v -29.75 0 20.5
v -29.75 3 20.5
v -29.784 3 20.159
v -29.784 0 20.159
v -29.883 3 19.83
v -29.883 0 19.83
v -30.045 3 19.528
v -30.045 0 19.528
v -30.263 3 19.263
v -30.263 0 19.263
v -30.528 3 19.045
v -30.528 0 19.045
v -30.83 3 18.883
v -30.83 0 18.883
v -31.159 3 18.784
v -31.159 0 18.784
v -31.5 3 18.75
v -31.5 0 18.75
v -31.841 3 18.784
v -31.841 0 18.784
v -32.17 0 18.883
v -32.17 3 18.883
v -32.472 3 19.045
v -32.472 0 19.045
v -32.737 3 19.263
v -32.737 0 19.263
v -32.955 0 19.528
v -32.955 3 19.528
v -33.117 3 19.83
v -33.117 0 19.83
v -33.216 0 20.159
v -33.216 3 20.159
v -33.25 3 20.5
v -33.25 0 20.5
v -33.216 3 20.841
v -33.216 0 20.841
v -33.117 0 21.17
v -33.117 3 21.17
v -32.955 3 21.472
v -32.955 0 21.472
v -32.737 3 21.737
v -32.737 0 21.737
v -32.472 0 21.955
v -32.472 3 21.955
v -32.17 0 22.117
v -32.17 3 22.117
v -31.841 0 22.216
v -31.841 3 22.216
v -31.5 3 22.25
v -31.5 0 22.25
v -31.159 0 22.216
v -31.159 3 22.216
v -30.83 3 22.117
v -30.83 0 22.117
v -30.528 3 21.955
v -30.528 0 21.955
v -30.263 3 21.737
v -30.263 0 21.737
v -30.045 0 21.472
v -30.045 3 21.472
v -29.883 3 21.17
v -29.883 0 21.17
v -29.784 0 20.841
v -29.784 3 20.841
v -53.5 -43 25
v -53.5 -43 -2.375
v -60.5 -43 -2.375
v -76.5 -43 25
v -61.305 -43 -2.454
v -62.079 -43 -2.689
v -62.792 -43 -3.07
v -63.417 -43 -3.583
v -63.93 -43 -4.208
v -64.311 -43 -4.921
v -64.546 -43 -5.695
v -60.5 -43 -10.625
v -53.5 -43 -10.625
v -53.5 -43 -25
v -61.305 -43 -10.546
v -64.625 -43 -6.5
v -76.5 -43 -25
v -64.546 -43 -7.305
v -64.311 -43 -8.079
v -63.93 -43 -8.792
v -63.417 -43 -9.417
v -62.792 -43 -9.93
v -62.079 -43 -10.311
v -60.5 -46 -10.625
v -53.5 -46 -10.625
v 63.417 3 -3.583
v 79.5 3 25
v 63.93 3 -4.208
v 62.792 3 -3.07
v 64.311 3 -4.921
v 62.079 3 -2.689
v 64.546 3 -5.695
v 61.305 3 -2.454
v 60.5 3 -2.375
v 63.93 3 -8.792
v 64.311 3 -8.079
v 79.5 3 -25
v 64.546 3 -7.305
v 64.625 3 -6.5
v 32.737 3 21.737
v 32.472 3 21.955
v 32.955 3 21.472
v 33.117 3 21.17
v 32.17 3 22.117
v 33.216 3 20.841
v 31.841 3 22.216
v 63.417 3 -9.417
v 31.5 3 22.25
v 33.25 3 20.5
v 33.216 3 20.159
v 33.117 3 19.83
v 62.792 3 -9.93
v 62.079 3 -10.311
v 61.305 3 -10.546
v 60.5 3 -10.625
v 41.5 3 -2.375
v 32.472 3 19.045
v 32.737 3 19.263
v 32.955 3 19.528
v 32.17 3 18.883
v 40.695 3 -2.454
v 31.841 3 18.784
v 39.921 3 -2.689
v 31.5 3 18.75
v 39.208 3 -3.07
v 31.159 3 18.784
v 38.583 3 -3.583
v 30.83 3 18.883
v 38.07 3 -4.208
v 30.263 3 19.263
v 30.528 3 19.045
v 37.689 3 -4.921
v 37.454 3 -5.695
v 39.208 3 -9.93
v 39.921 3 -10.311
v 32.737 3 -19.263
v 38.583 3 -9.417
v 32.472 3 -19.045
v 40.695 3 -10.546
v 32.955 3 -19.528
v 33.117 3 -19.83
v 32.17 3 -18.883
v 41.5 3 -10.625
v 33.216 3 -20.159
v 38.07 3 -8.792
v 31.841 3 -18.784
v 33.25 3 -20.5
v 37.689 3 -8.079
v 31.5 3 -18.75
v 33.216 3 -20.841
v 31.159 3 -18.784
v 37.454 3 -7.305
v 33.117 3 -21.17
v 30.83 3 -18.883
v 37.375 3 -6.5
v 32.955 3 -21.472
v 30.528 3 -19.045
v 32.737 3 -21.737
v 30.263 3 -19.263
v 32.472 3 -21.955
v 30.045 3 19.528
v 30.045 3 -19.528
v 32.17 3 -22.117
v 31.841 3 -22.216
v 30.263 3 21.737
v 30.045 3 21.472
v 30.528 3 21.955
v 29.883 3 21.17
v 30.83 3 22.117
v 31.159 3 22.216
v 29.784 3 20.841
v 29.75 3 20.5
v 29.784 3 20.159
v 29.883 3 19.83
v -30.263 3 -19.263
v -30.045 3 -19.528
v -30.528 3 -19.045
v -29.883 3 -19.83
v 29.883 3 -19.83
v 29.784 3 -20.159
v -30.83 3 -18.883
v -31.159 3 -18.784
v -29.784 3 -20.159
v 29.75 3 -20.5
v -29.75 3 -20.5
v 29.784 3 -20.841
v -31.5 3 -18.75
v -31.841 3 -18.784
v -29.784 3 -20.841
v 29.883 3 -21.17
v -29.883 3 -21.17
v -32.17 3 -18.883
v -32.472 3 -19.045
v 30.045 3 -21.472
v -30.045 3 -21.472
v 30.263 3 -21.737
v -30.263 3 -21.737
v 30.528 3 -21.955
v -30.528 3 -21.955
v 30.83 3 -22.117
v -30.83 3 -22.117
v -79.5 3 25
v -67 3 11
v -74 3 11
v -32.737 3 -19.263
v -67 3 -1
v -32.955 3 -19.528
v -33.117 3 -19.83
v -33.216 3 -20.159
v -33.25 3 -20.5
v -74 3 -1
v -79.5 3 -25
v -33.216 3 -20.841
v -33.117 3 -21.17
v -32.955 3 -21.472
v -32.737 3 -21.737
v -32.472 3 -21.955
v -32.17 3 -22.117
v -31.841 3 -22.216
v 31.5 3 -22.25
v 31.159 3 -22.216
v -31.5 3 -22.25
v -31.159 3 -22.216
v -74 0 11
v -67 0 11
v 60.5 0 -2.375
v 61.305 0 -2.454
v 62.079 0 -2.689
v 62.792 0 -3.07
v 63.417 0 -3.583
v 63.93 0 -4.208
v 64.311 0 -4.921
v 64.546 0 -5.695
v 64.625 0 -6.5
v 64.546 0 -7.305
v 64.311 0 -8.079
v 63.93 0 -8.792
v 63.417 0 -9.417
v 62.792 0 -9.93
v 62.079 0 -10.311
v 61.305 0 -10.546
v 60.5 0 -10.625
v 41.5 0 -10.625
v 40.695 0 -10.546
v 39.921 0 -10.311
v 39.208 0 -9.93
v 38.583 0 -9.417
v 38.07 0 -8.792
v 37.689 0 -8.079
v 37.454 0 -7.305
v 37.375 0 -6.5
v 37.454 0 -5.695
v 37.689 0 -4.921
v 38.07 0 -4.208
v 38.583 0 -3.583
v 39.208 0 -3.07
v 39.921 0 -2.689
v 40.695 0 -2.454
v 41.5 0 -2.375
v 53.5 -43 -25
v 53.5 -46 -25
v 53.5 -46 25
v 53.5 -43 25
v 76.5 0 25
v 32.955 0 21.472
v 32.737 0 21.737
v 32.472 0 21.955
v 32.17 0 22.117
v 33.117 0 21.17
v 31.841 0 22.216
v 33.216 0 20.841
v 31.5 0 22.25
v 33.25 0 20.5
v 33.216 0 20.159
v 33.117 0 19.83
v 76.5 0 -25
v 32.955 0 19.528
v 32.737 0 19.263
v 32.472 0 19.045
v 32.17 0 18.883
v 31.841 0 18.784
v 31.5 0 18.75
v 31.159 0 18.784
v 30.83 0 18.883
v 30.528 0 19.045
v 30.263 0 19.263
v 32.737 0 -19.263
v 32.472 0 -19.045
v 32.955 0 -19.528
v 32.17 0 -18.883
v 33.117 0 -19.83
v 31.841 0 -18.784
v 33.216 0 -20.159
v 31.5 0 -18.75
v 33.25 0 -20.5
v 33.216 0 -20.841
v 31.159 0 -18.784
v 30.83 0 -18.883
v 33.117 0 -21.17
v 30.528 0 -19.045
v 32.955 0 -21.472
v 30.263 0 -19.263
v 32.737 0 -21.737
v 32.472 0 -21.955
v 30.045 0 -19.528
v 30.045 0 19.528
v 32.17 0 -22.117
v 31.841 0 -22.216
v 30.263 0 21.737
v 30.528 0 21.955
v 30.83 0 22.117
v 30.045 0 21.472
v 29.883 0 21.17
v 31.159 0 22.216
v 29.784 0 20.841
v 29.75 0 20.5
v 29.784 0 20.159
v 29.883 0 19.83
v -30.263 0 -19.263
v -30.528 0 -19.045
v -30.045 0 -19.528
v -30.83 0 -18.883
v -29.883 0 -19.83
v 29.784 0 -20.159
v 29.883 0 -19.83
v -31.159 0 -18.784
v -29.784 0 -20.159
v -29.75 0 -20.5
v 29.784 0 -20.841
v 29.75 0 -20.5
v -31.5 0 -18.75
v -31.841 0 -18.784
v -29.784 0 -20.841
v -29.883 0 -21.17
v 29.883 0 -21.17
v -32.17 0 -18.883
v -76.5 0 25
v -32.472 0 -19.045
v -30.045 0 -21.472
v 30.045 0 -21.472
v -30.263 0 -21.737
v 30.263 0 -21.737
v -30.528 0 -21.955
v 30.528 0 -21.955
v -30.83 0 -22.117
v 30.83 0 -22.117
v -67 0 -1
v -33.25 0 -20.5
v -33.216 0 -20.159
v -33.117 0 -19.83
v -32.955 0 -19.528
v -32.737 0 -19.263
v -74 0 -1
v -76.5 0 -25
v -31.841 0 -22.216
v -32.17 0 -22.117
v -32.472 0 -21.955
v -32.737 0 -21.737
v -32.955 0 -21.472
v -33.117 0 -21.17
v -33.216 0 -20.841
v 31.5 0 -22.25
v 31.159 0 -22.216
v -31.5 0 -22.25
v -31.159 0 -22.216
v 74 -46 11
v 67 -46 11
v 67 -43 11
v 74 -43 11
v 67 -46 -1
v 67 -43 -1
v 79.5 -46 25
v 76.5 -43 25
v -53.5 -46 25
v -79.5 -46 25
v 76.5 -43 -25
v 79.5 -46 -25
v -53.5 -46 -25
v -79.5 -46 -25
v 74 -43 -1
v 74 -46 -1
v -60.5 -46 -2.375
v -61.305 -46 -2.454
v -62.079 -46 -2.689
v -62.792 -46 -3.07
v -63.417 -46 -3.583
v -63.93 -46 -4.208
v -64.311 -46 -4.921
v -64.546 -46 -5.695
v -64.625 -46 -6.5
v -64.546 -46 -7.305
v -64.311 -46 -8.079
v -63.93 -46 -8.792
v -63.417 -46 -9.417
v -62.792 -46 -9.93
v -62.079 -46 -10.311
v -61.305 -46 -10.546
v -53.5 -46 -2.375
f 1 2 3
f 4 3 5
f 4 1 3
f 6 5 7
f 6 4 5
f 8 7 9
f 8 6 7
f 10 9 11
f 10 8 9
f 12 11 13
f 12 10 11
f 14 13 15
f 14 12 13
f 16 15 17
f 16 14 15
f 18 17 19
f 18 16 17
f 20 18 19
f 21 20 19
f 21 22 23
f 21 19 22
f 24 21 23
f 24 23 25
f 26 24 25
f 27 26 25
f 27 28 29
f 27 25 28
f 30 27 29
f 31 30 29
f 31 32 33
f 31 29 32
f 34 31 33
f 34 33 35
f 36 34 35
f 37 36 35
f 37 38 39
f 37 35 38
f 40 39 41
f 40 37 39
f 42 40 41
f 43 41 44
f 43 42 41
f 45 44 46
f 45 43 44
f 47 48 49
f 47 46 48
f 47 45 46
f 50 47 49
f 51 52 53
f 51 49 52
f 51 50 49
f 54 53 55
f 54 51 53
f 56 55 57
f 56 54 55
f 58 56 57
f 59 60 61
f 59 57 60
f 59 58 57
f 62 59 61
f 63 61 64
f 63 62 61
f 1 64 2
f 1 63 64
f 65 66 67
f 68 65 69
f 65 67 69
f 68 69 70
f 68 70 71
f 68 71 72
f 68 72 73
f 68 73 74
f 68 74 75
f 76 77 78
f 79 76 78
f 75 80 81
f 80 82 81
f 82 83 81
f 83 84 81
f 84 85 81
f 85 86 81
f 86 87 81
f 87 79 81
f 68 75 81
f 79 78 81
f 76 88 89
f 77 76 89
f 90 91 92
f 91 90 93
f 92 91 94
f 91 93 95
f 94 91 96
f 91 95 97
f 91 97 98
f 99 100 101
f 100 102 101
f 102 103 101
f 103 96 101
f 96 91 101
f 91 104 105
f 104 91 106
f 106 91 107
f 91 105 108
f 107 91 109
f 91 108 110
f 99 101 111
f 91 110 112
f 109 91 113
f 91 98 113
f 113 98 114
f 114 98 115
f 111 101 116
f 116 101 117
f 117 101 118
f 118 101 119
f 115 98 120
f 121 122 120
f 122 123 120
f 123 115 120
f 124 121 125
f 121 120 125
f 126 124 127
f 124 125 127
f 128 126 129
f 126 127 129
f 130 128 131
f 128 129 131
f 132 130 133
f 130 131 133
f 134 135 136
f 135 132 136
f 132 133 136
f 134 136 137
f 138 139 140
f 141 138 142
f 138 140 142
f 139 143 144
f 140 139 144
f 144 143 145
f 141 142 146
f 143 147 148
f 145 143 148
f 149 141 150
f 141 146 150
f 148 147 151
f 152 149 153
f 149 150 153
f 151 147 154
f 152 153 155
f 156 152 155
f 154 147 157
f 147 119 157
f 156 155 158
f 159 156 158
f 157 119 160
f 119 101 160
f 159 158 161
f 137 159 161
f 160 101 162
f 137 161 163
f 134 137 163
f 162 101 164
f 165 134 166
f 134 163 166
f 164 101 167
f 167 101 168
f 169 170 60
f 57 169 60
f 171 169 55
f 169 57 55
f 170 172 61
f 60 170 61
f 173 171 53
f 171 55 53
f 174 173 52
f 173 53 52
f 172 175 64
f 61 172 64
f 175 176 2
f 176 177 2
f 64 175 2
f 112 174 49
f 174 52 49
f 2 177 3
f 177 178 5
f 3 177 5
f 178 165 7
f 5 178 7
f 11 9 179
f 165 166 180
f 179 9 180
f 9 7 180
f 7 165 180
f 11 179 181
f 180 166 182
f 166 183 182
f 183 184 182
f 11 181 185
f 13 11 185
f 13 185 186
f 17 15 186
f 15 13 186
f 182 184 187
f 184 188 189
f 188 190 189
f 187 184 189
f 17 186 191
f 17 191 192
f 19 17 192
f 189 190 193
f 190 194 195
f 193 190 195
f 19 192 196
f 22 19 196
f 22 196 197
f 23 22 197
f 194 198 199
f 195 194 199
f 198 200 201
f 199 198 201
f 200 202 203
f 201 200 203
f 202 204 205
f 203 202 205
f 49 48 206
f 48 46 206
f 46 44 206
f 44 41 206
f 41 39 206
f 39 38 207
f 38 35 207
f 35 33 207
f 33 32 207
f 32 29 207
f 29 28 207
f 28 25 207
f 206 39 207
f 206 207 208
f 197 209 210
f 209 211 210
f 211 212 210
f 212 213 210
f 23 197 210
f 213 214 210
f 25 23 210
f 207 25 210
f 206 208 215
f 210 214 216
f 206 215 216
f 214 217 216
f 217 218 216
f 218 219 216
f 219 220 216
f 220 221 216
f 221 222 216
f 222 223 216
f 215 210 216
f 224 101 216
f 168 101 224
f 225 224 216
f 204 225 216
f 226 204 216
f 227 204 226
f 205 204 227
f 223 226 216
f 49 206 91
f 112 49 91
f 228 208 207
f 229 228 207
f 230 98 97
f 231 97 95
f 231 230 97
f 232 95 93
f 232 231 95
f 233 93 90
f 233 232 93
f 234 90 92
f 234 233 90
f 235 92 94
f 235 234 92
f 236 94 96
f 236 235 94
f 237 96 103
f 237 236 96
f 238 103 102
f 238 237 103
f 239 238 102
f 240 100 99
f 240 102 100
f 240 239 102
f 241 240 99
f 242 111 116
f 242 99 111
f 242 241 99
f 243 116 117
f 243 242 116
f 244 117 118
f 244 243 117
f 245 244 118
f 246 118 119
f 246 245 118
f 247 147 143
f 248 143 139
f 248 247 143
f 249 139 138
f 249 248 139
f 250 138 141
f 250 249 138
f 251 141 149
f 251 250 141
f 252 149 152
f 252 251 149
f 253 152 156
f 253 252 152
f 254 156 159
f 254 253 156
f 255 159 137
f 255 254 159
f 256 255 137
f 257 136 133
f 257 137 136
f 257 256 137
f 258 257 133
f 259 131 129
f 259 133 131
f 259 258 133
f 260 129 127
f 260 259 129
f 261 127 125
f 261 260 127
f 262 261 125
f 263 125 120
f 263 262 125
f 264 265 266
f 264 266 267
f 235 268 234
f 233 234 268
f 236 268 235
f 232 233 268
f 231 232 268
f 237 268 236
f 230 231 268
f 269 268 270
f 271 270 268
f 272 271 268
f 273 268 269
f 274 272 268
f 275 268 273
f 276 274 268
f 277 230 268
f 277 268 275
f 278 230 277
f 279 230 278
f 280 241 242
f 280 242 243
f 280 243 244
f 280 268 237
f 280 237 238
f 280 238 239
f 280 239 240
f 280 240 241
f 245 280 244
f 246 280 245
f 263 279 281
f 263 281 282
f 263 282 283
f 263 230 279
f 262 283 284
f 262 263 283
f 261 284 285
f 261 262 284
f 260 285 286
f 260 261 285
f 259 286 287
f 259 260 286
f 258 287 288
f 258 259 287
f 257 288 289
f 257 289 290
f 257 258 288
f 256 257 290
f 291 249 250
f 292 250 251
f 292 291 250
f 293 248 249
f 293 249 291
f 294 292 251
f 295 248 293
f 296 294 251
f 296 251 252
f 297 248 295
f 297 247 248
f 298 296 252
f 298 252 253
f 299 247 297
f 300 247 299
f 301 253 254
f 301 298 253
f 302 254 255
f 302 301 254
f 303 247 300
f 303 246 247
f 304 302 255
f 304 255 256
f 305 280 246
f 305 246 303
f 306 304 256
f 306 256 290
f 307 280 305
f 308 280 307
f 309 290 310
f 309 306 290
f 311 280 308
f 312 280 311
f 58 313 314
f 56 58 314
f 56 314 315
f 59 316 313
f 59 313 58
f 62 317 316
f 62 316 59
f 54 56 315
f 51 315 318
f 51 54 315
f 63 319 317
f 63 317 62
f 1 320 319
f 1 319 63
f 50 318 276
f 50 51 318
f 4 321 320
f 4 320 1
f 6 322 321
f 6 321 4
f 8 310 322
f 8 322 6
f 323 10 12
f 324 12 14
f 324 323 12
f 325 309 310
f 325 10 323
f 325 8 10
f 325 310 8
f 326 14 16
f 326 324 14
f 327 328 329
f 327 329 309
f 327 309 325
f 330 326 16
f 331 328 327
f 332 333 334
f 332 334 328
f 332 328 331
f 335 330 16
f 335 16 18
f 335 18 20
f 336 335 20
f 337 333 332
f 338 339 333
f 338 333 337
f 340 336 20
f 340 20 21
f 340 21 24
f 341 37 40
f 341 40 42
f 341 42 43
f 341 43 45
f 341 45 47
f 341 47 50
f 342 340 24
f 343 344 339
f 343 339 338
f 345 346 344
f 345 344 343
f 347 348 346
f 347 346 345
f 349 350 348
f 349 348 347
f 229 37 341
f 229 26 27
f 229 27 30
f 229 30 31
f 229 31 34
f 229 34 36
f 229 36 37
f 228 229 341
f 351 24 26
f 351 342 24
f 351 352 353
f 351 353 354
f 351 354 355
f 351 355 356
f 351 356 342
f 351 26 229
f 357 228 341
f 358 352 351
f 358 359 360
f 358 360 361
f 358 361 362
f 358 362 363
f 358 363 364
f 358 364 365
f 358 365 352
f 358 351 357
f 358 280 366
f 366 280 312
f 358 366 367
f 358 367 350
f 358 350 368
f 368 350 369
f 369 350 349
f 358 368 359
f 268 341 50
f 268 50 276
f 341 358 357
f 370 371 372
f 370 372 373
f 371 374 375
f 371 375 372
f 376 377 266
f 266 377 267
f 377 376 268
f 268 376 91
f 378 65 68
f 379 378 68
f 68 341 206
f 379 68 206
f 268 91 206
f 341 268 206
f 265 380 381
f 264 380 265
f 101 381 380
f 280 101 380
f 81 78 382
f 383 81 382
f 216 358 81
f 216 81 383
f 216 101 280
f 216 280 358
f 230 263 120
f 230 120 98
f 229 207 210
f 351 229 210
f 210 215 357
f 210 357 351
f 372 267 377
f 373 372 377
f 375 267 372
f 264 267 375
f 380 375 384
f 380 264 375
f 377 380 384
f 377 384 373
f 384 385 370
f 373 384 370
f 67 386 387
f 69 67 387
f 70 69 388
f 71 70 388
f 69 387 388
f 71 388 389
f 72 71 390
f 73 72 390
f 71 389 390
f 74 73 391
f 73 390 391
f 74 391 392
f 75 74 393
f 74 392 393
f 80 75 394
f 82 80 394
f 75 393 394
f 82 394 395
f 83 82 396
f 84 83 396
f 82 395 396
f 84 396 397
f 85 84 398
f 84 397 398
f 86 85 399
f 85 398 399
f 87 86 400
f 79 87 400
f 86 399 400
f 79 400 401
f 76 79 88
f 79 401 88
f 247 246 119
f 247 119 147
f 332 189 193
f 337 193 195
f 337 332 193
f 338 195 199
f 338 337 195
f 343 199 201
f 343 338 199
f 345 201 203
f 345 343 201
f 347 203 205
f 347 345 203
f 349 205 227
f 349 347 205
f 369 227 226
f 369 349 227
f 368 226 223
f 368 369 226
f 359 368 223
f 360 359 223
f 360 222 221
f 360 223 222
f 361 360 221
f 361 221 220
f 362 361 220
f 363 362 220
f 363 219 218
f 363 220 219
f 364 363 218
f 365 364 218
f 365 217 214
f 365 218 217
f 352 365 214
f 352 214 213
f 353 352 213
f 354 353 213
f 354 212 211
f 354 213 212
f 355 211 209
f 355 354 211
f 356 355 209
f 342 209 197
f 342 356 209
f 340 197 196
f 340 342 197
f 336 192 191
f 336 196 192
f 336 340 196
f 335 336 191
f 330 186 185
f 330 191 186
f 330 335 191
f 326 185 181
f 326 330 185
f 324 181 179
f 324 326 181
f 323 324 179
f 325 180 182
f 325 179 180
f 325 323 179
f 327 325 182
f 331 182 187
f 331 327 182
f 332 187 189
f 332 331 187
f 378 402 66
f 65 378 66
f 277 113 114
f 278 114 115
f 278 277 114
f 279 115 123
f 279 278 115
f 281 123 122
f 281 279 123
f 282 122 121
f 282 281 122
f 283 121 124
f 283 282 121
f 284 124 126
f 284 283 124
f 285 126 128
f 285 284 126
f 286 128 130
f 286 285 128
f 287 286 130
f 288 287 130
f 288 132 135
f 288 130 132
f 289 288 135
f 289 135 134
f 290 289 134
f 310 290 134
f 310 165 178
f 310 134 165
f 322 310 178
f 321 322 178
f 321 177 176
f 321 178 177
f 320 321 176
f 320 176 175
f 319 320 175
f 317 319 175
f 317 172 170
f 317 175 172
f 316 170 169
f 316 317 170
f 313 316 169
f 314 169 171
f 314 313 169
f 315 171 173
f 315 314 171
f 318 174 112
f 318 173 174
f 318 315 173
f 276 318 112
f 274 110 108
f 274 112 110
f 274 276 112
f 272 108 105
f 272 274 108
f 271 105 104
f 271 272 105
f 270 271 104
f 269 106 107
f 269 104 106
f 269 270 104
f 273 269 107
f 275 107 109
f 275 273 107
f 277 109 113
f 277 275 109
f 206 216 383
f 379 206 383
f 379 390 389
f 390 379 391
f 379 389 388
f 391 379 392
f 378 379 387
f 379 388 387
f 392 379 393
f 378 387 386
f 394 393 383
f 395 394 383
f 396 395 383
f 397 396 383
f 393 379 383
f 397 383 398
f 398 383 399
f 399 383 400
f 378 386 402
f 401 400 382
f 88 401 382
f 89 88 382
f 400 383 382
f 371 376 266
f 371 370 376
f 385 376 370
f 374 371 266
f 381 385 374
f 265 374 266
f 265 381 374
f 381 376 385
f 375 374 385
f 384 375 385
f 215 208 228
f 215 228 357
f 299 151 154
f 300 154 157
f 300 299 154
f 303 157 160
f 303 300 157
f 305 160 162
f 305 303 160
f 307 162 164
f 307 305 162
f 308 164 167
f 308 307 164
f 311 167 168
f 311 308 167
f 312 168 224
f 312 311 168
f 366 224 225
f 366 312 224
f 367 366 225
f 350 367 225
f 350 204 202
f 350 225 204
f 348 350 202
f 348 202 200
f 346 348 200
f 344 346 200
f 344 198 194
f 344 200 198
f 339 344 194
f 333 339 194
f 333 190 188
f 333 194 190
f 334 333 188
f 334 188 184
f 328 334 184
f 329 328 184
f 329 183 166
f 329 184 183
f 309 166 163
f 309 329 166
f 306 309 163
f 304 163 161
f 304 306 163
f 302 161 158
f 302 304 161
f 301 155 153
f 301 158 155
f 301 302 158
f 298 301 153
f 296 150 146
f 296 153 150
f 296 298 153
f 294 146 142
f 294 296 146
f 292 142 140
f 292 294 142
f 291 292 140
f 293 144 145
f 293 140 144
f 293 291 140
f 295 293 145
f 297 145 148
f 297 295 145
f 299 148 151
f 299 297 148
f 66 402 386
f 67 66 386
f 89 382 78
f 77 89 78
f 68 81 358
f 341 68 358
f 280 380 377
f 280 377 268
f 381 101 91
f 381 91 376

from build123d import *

# Parameters (mm, degrees)
BOSS_EXTRUDE1_DEPTH = 3
BOSS_EXTRUDE2_DEPTH = 50
CUT_EXTRUDE1_REACH  = 51
CUT_EXTRUDE2_REACH  = 5
CUT_EXTRUDE3_REACH  = 51
SKETCH7_W           = 7
SKETCH7_H           = 12
CUT_EXTRUDE5_REACH  = 51
SKETCH8_W           = 7
SKETCH8_H           = 12
CUT_EXTRUDE7_REACH  = 5
SKETCH1_R           = 1.75


with BuildPart() as part:
    # Sketch2 → Boss-Extrude1 (new body)
    with BuildSketch(Plane(origin=(0, 0, 0), x_dir=(1, 0, 0), z_dir=(0, 1, 0))):
        Polygon((-52.5, 25), (52.5, 25), (76.5, 25), (79.5, 25), (79.5, -25), (76.5, -25), (52.5, -25), (-52.5, -25), (-76.5, -25), (-79.5, -25), (-79.5, 25), (-76.5, 25), align=None)
    extrude(amount=BOSS_EXTRUDE1_DEPTH)

    # Sketch4 → Boss-Extrude2 (add)
    with BuildSketch(Plane(origin=(0, 0, -25), x_dir=(-1, 0, 0), z_dir=(0, 0, -1))):
        Polygon((79.5, 0), (79.5, -46), (53.5, -46), (53.5, -43), (76.5, -43), (76.5, 0), align=None)
    boss_extrude2 = extrude(amount=-BOSS_EXTRUDE2_DEPTH)

    # Mirror1: Boss-Extrude2 across plane
    add(boss_extrude2.mirror(Plane(origin=(0, 0, 0), x_dir=(0, 0, 1), z_dir=(1, 0, 0))))

    # Sketch5 → Cut-Extrude1 (cut, up to next)
    with BuildSketch(Plane.XZ.offset(46), mode=Mode.PRIVATE) as cut_extrude1_sk1:
        with BuildLine():
            Line((-53.5, -2.375), (-60.5, -2.375))
            ThreePointArc((-60.5, -2.375), (-64.625, -6.5), (-60.5, -10.625))
            Line((-60.5, -10.625), (-53.5, -10.625))
            Line((-53.5, -10.625), (-53.5, -2.375))
        make_face()
    cut_extrude1_tool1 = extrude(cut_extrude1_sk1.sketch, amount=-CUT_EXTRUDE1_REACH, mode=Mode.PRIVATE) & part.part
    add(cut_extrude1_tool1.solids().sort_by_distance((-58.661274, -46, -6.5))[0], mode=Mode.SUBTRACT)

    # Sketch6 → Cut-Extrude2 (cut, up to next)
    with BuildSketch(Plane.XZ, mode=Mode.PRIVATE) as cut_extrude2_sk1:
        with BuildLine():
            Line((41.5, -2.375), (60.5, -2.375))
            ThreePointArc((60.5, -2.375), (64.625, -6.5), (60.5, -10.625))
            Line((60.5, -10.625), (41.5, -10.625))
            ThreePointArc((41.5, -10.625), (37.375, -6.5), (41.5, -2.375))
        make_face()
    cut_extrude2_tool1 = extrude(cut_extrude2_sk1.sketch, amount=-CUT_EXTRUDE2_REACH, mode=Mode.PRIVATE) & part.part
    add(cut_extrude2_tool1.solids().sort_by_distance((51, 0, -6.5))[0], mode=Mode.SUBTRACT)

    # Sketch7 → Cut-Extrude3 (cut, up to next)
    with BuildSketch(Plane.XZ.offset(46), mode=Mode.PRIVATE) as cut_extrude3_sk1:
        with Locations((70.5, 5)):
            Rectangle(SKETCH7_W, SKETCH7_H)
    cut_extrude3_tool1 = extrude(cut_extrude3_sk1.sketch, amount=-CUT_EXTRUDE3_REACH, mode=Mode.PRIVATE) & part.part
    add(cut_extrude3_tool1.solids().sort_by_distance((70.5, -46, 5))[0], mode=Mode.SUBTRACT)

    # Sketch8 → Cut-Extrude5 (cut, up to next)
    with BuildSketch(Plane(origin=(0, 3, 0), x_dir=(1, 0, 0), z_dir=(0, 1, 0)), mode=Mode.PRIVATE) as cut_extrude5_sk1:
        with Locations((-70.5, -5)):
            Rectangle(SKETCH8_W, SKETCH8_H)
    cut_extrude5_tool1 = extrude(cut_extrude5_sk1.sketch, amount=-CUT_EXTRUDE5_REACH, mode=Mode.PRIVATE) & part.part
    add(cut_extrude5_tool1.solids().sort_by_distance((-70.5, 3, 5))[0], mode=Mode.SUBTRACT)

    # Sketch1 → Cut-Extrude7 (cut, up to next)
    with BuildSketch(Plane(origin=(0, 0, 0), x_dir=(1, 0, 0), z_dir=(0, 1, 0)), mode=Mode.PRIVATE) as cut_extrude7_sk1:
        with Locations((-31.5, 20.5)):
            Circle(SKETCH1_R)
    cut_extrude7_tool1 = extrude(cut_extrude7_sk1.sketch, amount=CUT_EXTRUDE7_REACH, mode=Mode.PRIVATE) & part.part
    add(cut_extrude7_tool1.solids().sort_by_distance((-31.5, 0, -20.5))[0], mode=Mode.SUBTRACT)
    # Sketch1 → Cut-Extrude7 (cut, up to next)
    with BuildSketch(Plane(origin=(0, 0, 0), x_dir=(1, 0, 0), z_dir=(0, 1, 0)), mode=Mode.PRIVATE) as cut_extrude7_sk2:
        with Locations((-31.5, -20.5)):
            Circle(SKETCH1_R)
    cut_extrude7_tool2 = extrude(cut_extrude7_sk2.sketch, amount=CUT_EXTRUDE7_REACH, mode=Mode.PRIVATE) & part.part
    add(cut_extrude7_tool2.solids().sort_by_distance((-31.5, 0, 20.5))[0], mode=Mode.SUBTRACT)
    # Sketch1 → Cut-Extrude7 (cut, up to next)
    with BuildSketch(Plane(origin=(0, 0, 0), x_dir=(1, 0, 0), z_dir=(0, 1, 0)), mode=Mode.PRIVATE) as cut_extrude7_sk3:
        with Locations((31.5, -20.5)):
            Circle(SKETCH1_R)
    cut_extrude7_tool3 = extrude(cut_extrude7_sk3.sketch, amount=CUT_EXTRUDE7_REACH, mode=Mode.PRIVATE) & part.part
    add(cut_extrude7_tool3.solids().sort_by_distance((31.5, 0, 20.5))[0], mode=Mode.SUBTRACT)
    # Sketch1 → Cut-Extrude7 (cut, up to next)
    with BuildSketch(Plane(origin=(0, 0, 0), x_dir=(1, 0, 0), z_dir=(0, 1, 0)), mode=Mode.PRIVATE) as cut_extrude7_sk4:
        with Locations((31.5, 20.5)):
            Circle(SKETCH1_R)
    cut_extrude7_tool4 = extrude(cut_extrude7_sk4.sketch, amount=CUT_EXTRUDE7_REACH, mode=Mode.PRIVATE) & part.part
    add(cut_extrude7_tool4.solids().sort_by_distance((31.5, 0, -20.5))[0], mode=Mode.SUBTRACT)


solid = part.part
